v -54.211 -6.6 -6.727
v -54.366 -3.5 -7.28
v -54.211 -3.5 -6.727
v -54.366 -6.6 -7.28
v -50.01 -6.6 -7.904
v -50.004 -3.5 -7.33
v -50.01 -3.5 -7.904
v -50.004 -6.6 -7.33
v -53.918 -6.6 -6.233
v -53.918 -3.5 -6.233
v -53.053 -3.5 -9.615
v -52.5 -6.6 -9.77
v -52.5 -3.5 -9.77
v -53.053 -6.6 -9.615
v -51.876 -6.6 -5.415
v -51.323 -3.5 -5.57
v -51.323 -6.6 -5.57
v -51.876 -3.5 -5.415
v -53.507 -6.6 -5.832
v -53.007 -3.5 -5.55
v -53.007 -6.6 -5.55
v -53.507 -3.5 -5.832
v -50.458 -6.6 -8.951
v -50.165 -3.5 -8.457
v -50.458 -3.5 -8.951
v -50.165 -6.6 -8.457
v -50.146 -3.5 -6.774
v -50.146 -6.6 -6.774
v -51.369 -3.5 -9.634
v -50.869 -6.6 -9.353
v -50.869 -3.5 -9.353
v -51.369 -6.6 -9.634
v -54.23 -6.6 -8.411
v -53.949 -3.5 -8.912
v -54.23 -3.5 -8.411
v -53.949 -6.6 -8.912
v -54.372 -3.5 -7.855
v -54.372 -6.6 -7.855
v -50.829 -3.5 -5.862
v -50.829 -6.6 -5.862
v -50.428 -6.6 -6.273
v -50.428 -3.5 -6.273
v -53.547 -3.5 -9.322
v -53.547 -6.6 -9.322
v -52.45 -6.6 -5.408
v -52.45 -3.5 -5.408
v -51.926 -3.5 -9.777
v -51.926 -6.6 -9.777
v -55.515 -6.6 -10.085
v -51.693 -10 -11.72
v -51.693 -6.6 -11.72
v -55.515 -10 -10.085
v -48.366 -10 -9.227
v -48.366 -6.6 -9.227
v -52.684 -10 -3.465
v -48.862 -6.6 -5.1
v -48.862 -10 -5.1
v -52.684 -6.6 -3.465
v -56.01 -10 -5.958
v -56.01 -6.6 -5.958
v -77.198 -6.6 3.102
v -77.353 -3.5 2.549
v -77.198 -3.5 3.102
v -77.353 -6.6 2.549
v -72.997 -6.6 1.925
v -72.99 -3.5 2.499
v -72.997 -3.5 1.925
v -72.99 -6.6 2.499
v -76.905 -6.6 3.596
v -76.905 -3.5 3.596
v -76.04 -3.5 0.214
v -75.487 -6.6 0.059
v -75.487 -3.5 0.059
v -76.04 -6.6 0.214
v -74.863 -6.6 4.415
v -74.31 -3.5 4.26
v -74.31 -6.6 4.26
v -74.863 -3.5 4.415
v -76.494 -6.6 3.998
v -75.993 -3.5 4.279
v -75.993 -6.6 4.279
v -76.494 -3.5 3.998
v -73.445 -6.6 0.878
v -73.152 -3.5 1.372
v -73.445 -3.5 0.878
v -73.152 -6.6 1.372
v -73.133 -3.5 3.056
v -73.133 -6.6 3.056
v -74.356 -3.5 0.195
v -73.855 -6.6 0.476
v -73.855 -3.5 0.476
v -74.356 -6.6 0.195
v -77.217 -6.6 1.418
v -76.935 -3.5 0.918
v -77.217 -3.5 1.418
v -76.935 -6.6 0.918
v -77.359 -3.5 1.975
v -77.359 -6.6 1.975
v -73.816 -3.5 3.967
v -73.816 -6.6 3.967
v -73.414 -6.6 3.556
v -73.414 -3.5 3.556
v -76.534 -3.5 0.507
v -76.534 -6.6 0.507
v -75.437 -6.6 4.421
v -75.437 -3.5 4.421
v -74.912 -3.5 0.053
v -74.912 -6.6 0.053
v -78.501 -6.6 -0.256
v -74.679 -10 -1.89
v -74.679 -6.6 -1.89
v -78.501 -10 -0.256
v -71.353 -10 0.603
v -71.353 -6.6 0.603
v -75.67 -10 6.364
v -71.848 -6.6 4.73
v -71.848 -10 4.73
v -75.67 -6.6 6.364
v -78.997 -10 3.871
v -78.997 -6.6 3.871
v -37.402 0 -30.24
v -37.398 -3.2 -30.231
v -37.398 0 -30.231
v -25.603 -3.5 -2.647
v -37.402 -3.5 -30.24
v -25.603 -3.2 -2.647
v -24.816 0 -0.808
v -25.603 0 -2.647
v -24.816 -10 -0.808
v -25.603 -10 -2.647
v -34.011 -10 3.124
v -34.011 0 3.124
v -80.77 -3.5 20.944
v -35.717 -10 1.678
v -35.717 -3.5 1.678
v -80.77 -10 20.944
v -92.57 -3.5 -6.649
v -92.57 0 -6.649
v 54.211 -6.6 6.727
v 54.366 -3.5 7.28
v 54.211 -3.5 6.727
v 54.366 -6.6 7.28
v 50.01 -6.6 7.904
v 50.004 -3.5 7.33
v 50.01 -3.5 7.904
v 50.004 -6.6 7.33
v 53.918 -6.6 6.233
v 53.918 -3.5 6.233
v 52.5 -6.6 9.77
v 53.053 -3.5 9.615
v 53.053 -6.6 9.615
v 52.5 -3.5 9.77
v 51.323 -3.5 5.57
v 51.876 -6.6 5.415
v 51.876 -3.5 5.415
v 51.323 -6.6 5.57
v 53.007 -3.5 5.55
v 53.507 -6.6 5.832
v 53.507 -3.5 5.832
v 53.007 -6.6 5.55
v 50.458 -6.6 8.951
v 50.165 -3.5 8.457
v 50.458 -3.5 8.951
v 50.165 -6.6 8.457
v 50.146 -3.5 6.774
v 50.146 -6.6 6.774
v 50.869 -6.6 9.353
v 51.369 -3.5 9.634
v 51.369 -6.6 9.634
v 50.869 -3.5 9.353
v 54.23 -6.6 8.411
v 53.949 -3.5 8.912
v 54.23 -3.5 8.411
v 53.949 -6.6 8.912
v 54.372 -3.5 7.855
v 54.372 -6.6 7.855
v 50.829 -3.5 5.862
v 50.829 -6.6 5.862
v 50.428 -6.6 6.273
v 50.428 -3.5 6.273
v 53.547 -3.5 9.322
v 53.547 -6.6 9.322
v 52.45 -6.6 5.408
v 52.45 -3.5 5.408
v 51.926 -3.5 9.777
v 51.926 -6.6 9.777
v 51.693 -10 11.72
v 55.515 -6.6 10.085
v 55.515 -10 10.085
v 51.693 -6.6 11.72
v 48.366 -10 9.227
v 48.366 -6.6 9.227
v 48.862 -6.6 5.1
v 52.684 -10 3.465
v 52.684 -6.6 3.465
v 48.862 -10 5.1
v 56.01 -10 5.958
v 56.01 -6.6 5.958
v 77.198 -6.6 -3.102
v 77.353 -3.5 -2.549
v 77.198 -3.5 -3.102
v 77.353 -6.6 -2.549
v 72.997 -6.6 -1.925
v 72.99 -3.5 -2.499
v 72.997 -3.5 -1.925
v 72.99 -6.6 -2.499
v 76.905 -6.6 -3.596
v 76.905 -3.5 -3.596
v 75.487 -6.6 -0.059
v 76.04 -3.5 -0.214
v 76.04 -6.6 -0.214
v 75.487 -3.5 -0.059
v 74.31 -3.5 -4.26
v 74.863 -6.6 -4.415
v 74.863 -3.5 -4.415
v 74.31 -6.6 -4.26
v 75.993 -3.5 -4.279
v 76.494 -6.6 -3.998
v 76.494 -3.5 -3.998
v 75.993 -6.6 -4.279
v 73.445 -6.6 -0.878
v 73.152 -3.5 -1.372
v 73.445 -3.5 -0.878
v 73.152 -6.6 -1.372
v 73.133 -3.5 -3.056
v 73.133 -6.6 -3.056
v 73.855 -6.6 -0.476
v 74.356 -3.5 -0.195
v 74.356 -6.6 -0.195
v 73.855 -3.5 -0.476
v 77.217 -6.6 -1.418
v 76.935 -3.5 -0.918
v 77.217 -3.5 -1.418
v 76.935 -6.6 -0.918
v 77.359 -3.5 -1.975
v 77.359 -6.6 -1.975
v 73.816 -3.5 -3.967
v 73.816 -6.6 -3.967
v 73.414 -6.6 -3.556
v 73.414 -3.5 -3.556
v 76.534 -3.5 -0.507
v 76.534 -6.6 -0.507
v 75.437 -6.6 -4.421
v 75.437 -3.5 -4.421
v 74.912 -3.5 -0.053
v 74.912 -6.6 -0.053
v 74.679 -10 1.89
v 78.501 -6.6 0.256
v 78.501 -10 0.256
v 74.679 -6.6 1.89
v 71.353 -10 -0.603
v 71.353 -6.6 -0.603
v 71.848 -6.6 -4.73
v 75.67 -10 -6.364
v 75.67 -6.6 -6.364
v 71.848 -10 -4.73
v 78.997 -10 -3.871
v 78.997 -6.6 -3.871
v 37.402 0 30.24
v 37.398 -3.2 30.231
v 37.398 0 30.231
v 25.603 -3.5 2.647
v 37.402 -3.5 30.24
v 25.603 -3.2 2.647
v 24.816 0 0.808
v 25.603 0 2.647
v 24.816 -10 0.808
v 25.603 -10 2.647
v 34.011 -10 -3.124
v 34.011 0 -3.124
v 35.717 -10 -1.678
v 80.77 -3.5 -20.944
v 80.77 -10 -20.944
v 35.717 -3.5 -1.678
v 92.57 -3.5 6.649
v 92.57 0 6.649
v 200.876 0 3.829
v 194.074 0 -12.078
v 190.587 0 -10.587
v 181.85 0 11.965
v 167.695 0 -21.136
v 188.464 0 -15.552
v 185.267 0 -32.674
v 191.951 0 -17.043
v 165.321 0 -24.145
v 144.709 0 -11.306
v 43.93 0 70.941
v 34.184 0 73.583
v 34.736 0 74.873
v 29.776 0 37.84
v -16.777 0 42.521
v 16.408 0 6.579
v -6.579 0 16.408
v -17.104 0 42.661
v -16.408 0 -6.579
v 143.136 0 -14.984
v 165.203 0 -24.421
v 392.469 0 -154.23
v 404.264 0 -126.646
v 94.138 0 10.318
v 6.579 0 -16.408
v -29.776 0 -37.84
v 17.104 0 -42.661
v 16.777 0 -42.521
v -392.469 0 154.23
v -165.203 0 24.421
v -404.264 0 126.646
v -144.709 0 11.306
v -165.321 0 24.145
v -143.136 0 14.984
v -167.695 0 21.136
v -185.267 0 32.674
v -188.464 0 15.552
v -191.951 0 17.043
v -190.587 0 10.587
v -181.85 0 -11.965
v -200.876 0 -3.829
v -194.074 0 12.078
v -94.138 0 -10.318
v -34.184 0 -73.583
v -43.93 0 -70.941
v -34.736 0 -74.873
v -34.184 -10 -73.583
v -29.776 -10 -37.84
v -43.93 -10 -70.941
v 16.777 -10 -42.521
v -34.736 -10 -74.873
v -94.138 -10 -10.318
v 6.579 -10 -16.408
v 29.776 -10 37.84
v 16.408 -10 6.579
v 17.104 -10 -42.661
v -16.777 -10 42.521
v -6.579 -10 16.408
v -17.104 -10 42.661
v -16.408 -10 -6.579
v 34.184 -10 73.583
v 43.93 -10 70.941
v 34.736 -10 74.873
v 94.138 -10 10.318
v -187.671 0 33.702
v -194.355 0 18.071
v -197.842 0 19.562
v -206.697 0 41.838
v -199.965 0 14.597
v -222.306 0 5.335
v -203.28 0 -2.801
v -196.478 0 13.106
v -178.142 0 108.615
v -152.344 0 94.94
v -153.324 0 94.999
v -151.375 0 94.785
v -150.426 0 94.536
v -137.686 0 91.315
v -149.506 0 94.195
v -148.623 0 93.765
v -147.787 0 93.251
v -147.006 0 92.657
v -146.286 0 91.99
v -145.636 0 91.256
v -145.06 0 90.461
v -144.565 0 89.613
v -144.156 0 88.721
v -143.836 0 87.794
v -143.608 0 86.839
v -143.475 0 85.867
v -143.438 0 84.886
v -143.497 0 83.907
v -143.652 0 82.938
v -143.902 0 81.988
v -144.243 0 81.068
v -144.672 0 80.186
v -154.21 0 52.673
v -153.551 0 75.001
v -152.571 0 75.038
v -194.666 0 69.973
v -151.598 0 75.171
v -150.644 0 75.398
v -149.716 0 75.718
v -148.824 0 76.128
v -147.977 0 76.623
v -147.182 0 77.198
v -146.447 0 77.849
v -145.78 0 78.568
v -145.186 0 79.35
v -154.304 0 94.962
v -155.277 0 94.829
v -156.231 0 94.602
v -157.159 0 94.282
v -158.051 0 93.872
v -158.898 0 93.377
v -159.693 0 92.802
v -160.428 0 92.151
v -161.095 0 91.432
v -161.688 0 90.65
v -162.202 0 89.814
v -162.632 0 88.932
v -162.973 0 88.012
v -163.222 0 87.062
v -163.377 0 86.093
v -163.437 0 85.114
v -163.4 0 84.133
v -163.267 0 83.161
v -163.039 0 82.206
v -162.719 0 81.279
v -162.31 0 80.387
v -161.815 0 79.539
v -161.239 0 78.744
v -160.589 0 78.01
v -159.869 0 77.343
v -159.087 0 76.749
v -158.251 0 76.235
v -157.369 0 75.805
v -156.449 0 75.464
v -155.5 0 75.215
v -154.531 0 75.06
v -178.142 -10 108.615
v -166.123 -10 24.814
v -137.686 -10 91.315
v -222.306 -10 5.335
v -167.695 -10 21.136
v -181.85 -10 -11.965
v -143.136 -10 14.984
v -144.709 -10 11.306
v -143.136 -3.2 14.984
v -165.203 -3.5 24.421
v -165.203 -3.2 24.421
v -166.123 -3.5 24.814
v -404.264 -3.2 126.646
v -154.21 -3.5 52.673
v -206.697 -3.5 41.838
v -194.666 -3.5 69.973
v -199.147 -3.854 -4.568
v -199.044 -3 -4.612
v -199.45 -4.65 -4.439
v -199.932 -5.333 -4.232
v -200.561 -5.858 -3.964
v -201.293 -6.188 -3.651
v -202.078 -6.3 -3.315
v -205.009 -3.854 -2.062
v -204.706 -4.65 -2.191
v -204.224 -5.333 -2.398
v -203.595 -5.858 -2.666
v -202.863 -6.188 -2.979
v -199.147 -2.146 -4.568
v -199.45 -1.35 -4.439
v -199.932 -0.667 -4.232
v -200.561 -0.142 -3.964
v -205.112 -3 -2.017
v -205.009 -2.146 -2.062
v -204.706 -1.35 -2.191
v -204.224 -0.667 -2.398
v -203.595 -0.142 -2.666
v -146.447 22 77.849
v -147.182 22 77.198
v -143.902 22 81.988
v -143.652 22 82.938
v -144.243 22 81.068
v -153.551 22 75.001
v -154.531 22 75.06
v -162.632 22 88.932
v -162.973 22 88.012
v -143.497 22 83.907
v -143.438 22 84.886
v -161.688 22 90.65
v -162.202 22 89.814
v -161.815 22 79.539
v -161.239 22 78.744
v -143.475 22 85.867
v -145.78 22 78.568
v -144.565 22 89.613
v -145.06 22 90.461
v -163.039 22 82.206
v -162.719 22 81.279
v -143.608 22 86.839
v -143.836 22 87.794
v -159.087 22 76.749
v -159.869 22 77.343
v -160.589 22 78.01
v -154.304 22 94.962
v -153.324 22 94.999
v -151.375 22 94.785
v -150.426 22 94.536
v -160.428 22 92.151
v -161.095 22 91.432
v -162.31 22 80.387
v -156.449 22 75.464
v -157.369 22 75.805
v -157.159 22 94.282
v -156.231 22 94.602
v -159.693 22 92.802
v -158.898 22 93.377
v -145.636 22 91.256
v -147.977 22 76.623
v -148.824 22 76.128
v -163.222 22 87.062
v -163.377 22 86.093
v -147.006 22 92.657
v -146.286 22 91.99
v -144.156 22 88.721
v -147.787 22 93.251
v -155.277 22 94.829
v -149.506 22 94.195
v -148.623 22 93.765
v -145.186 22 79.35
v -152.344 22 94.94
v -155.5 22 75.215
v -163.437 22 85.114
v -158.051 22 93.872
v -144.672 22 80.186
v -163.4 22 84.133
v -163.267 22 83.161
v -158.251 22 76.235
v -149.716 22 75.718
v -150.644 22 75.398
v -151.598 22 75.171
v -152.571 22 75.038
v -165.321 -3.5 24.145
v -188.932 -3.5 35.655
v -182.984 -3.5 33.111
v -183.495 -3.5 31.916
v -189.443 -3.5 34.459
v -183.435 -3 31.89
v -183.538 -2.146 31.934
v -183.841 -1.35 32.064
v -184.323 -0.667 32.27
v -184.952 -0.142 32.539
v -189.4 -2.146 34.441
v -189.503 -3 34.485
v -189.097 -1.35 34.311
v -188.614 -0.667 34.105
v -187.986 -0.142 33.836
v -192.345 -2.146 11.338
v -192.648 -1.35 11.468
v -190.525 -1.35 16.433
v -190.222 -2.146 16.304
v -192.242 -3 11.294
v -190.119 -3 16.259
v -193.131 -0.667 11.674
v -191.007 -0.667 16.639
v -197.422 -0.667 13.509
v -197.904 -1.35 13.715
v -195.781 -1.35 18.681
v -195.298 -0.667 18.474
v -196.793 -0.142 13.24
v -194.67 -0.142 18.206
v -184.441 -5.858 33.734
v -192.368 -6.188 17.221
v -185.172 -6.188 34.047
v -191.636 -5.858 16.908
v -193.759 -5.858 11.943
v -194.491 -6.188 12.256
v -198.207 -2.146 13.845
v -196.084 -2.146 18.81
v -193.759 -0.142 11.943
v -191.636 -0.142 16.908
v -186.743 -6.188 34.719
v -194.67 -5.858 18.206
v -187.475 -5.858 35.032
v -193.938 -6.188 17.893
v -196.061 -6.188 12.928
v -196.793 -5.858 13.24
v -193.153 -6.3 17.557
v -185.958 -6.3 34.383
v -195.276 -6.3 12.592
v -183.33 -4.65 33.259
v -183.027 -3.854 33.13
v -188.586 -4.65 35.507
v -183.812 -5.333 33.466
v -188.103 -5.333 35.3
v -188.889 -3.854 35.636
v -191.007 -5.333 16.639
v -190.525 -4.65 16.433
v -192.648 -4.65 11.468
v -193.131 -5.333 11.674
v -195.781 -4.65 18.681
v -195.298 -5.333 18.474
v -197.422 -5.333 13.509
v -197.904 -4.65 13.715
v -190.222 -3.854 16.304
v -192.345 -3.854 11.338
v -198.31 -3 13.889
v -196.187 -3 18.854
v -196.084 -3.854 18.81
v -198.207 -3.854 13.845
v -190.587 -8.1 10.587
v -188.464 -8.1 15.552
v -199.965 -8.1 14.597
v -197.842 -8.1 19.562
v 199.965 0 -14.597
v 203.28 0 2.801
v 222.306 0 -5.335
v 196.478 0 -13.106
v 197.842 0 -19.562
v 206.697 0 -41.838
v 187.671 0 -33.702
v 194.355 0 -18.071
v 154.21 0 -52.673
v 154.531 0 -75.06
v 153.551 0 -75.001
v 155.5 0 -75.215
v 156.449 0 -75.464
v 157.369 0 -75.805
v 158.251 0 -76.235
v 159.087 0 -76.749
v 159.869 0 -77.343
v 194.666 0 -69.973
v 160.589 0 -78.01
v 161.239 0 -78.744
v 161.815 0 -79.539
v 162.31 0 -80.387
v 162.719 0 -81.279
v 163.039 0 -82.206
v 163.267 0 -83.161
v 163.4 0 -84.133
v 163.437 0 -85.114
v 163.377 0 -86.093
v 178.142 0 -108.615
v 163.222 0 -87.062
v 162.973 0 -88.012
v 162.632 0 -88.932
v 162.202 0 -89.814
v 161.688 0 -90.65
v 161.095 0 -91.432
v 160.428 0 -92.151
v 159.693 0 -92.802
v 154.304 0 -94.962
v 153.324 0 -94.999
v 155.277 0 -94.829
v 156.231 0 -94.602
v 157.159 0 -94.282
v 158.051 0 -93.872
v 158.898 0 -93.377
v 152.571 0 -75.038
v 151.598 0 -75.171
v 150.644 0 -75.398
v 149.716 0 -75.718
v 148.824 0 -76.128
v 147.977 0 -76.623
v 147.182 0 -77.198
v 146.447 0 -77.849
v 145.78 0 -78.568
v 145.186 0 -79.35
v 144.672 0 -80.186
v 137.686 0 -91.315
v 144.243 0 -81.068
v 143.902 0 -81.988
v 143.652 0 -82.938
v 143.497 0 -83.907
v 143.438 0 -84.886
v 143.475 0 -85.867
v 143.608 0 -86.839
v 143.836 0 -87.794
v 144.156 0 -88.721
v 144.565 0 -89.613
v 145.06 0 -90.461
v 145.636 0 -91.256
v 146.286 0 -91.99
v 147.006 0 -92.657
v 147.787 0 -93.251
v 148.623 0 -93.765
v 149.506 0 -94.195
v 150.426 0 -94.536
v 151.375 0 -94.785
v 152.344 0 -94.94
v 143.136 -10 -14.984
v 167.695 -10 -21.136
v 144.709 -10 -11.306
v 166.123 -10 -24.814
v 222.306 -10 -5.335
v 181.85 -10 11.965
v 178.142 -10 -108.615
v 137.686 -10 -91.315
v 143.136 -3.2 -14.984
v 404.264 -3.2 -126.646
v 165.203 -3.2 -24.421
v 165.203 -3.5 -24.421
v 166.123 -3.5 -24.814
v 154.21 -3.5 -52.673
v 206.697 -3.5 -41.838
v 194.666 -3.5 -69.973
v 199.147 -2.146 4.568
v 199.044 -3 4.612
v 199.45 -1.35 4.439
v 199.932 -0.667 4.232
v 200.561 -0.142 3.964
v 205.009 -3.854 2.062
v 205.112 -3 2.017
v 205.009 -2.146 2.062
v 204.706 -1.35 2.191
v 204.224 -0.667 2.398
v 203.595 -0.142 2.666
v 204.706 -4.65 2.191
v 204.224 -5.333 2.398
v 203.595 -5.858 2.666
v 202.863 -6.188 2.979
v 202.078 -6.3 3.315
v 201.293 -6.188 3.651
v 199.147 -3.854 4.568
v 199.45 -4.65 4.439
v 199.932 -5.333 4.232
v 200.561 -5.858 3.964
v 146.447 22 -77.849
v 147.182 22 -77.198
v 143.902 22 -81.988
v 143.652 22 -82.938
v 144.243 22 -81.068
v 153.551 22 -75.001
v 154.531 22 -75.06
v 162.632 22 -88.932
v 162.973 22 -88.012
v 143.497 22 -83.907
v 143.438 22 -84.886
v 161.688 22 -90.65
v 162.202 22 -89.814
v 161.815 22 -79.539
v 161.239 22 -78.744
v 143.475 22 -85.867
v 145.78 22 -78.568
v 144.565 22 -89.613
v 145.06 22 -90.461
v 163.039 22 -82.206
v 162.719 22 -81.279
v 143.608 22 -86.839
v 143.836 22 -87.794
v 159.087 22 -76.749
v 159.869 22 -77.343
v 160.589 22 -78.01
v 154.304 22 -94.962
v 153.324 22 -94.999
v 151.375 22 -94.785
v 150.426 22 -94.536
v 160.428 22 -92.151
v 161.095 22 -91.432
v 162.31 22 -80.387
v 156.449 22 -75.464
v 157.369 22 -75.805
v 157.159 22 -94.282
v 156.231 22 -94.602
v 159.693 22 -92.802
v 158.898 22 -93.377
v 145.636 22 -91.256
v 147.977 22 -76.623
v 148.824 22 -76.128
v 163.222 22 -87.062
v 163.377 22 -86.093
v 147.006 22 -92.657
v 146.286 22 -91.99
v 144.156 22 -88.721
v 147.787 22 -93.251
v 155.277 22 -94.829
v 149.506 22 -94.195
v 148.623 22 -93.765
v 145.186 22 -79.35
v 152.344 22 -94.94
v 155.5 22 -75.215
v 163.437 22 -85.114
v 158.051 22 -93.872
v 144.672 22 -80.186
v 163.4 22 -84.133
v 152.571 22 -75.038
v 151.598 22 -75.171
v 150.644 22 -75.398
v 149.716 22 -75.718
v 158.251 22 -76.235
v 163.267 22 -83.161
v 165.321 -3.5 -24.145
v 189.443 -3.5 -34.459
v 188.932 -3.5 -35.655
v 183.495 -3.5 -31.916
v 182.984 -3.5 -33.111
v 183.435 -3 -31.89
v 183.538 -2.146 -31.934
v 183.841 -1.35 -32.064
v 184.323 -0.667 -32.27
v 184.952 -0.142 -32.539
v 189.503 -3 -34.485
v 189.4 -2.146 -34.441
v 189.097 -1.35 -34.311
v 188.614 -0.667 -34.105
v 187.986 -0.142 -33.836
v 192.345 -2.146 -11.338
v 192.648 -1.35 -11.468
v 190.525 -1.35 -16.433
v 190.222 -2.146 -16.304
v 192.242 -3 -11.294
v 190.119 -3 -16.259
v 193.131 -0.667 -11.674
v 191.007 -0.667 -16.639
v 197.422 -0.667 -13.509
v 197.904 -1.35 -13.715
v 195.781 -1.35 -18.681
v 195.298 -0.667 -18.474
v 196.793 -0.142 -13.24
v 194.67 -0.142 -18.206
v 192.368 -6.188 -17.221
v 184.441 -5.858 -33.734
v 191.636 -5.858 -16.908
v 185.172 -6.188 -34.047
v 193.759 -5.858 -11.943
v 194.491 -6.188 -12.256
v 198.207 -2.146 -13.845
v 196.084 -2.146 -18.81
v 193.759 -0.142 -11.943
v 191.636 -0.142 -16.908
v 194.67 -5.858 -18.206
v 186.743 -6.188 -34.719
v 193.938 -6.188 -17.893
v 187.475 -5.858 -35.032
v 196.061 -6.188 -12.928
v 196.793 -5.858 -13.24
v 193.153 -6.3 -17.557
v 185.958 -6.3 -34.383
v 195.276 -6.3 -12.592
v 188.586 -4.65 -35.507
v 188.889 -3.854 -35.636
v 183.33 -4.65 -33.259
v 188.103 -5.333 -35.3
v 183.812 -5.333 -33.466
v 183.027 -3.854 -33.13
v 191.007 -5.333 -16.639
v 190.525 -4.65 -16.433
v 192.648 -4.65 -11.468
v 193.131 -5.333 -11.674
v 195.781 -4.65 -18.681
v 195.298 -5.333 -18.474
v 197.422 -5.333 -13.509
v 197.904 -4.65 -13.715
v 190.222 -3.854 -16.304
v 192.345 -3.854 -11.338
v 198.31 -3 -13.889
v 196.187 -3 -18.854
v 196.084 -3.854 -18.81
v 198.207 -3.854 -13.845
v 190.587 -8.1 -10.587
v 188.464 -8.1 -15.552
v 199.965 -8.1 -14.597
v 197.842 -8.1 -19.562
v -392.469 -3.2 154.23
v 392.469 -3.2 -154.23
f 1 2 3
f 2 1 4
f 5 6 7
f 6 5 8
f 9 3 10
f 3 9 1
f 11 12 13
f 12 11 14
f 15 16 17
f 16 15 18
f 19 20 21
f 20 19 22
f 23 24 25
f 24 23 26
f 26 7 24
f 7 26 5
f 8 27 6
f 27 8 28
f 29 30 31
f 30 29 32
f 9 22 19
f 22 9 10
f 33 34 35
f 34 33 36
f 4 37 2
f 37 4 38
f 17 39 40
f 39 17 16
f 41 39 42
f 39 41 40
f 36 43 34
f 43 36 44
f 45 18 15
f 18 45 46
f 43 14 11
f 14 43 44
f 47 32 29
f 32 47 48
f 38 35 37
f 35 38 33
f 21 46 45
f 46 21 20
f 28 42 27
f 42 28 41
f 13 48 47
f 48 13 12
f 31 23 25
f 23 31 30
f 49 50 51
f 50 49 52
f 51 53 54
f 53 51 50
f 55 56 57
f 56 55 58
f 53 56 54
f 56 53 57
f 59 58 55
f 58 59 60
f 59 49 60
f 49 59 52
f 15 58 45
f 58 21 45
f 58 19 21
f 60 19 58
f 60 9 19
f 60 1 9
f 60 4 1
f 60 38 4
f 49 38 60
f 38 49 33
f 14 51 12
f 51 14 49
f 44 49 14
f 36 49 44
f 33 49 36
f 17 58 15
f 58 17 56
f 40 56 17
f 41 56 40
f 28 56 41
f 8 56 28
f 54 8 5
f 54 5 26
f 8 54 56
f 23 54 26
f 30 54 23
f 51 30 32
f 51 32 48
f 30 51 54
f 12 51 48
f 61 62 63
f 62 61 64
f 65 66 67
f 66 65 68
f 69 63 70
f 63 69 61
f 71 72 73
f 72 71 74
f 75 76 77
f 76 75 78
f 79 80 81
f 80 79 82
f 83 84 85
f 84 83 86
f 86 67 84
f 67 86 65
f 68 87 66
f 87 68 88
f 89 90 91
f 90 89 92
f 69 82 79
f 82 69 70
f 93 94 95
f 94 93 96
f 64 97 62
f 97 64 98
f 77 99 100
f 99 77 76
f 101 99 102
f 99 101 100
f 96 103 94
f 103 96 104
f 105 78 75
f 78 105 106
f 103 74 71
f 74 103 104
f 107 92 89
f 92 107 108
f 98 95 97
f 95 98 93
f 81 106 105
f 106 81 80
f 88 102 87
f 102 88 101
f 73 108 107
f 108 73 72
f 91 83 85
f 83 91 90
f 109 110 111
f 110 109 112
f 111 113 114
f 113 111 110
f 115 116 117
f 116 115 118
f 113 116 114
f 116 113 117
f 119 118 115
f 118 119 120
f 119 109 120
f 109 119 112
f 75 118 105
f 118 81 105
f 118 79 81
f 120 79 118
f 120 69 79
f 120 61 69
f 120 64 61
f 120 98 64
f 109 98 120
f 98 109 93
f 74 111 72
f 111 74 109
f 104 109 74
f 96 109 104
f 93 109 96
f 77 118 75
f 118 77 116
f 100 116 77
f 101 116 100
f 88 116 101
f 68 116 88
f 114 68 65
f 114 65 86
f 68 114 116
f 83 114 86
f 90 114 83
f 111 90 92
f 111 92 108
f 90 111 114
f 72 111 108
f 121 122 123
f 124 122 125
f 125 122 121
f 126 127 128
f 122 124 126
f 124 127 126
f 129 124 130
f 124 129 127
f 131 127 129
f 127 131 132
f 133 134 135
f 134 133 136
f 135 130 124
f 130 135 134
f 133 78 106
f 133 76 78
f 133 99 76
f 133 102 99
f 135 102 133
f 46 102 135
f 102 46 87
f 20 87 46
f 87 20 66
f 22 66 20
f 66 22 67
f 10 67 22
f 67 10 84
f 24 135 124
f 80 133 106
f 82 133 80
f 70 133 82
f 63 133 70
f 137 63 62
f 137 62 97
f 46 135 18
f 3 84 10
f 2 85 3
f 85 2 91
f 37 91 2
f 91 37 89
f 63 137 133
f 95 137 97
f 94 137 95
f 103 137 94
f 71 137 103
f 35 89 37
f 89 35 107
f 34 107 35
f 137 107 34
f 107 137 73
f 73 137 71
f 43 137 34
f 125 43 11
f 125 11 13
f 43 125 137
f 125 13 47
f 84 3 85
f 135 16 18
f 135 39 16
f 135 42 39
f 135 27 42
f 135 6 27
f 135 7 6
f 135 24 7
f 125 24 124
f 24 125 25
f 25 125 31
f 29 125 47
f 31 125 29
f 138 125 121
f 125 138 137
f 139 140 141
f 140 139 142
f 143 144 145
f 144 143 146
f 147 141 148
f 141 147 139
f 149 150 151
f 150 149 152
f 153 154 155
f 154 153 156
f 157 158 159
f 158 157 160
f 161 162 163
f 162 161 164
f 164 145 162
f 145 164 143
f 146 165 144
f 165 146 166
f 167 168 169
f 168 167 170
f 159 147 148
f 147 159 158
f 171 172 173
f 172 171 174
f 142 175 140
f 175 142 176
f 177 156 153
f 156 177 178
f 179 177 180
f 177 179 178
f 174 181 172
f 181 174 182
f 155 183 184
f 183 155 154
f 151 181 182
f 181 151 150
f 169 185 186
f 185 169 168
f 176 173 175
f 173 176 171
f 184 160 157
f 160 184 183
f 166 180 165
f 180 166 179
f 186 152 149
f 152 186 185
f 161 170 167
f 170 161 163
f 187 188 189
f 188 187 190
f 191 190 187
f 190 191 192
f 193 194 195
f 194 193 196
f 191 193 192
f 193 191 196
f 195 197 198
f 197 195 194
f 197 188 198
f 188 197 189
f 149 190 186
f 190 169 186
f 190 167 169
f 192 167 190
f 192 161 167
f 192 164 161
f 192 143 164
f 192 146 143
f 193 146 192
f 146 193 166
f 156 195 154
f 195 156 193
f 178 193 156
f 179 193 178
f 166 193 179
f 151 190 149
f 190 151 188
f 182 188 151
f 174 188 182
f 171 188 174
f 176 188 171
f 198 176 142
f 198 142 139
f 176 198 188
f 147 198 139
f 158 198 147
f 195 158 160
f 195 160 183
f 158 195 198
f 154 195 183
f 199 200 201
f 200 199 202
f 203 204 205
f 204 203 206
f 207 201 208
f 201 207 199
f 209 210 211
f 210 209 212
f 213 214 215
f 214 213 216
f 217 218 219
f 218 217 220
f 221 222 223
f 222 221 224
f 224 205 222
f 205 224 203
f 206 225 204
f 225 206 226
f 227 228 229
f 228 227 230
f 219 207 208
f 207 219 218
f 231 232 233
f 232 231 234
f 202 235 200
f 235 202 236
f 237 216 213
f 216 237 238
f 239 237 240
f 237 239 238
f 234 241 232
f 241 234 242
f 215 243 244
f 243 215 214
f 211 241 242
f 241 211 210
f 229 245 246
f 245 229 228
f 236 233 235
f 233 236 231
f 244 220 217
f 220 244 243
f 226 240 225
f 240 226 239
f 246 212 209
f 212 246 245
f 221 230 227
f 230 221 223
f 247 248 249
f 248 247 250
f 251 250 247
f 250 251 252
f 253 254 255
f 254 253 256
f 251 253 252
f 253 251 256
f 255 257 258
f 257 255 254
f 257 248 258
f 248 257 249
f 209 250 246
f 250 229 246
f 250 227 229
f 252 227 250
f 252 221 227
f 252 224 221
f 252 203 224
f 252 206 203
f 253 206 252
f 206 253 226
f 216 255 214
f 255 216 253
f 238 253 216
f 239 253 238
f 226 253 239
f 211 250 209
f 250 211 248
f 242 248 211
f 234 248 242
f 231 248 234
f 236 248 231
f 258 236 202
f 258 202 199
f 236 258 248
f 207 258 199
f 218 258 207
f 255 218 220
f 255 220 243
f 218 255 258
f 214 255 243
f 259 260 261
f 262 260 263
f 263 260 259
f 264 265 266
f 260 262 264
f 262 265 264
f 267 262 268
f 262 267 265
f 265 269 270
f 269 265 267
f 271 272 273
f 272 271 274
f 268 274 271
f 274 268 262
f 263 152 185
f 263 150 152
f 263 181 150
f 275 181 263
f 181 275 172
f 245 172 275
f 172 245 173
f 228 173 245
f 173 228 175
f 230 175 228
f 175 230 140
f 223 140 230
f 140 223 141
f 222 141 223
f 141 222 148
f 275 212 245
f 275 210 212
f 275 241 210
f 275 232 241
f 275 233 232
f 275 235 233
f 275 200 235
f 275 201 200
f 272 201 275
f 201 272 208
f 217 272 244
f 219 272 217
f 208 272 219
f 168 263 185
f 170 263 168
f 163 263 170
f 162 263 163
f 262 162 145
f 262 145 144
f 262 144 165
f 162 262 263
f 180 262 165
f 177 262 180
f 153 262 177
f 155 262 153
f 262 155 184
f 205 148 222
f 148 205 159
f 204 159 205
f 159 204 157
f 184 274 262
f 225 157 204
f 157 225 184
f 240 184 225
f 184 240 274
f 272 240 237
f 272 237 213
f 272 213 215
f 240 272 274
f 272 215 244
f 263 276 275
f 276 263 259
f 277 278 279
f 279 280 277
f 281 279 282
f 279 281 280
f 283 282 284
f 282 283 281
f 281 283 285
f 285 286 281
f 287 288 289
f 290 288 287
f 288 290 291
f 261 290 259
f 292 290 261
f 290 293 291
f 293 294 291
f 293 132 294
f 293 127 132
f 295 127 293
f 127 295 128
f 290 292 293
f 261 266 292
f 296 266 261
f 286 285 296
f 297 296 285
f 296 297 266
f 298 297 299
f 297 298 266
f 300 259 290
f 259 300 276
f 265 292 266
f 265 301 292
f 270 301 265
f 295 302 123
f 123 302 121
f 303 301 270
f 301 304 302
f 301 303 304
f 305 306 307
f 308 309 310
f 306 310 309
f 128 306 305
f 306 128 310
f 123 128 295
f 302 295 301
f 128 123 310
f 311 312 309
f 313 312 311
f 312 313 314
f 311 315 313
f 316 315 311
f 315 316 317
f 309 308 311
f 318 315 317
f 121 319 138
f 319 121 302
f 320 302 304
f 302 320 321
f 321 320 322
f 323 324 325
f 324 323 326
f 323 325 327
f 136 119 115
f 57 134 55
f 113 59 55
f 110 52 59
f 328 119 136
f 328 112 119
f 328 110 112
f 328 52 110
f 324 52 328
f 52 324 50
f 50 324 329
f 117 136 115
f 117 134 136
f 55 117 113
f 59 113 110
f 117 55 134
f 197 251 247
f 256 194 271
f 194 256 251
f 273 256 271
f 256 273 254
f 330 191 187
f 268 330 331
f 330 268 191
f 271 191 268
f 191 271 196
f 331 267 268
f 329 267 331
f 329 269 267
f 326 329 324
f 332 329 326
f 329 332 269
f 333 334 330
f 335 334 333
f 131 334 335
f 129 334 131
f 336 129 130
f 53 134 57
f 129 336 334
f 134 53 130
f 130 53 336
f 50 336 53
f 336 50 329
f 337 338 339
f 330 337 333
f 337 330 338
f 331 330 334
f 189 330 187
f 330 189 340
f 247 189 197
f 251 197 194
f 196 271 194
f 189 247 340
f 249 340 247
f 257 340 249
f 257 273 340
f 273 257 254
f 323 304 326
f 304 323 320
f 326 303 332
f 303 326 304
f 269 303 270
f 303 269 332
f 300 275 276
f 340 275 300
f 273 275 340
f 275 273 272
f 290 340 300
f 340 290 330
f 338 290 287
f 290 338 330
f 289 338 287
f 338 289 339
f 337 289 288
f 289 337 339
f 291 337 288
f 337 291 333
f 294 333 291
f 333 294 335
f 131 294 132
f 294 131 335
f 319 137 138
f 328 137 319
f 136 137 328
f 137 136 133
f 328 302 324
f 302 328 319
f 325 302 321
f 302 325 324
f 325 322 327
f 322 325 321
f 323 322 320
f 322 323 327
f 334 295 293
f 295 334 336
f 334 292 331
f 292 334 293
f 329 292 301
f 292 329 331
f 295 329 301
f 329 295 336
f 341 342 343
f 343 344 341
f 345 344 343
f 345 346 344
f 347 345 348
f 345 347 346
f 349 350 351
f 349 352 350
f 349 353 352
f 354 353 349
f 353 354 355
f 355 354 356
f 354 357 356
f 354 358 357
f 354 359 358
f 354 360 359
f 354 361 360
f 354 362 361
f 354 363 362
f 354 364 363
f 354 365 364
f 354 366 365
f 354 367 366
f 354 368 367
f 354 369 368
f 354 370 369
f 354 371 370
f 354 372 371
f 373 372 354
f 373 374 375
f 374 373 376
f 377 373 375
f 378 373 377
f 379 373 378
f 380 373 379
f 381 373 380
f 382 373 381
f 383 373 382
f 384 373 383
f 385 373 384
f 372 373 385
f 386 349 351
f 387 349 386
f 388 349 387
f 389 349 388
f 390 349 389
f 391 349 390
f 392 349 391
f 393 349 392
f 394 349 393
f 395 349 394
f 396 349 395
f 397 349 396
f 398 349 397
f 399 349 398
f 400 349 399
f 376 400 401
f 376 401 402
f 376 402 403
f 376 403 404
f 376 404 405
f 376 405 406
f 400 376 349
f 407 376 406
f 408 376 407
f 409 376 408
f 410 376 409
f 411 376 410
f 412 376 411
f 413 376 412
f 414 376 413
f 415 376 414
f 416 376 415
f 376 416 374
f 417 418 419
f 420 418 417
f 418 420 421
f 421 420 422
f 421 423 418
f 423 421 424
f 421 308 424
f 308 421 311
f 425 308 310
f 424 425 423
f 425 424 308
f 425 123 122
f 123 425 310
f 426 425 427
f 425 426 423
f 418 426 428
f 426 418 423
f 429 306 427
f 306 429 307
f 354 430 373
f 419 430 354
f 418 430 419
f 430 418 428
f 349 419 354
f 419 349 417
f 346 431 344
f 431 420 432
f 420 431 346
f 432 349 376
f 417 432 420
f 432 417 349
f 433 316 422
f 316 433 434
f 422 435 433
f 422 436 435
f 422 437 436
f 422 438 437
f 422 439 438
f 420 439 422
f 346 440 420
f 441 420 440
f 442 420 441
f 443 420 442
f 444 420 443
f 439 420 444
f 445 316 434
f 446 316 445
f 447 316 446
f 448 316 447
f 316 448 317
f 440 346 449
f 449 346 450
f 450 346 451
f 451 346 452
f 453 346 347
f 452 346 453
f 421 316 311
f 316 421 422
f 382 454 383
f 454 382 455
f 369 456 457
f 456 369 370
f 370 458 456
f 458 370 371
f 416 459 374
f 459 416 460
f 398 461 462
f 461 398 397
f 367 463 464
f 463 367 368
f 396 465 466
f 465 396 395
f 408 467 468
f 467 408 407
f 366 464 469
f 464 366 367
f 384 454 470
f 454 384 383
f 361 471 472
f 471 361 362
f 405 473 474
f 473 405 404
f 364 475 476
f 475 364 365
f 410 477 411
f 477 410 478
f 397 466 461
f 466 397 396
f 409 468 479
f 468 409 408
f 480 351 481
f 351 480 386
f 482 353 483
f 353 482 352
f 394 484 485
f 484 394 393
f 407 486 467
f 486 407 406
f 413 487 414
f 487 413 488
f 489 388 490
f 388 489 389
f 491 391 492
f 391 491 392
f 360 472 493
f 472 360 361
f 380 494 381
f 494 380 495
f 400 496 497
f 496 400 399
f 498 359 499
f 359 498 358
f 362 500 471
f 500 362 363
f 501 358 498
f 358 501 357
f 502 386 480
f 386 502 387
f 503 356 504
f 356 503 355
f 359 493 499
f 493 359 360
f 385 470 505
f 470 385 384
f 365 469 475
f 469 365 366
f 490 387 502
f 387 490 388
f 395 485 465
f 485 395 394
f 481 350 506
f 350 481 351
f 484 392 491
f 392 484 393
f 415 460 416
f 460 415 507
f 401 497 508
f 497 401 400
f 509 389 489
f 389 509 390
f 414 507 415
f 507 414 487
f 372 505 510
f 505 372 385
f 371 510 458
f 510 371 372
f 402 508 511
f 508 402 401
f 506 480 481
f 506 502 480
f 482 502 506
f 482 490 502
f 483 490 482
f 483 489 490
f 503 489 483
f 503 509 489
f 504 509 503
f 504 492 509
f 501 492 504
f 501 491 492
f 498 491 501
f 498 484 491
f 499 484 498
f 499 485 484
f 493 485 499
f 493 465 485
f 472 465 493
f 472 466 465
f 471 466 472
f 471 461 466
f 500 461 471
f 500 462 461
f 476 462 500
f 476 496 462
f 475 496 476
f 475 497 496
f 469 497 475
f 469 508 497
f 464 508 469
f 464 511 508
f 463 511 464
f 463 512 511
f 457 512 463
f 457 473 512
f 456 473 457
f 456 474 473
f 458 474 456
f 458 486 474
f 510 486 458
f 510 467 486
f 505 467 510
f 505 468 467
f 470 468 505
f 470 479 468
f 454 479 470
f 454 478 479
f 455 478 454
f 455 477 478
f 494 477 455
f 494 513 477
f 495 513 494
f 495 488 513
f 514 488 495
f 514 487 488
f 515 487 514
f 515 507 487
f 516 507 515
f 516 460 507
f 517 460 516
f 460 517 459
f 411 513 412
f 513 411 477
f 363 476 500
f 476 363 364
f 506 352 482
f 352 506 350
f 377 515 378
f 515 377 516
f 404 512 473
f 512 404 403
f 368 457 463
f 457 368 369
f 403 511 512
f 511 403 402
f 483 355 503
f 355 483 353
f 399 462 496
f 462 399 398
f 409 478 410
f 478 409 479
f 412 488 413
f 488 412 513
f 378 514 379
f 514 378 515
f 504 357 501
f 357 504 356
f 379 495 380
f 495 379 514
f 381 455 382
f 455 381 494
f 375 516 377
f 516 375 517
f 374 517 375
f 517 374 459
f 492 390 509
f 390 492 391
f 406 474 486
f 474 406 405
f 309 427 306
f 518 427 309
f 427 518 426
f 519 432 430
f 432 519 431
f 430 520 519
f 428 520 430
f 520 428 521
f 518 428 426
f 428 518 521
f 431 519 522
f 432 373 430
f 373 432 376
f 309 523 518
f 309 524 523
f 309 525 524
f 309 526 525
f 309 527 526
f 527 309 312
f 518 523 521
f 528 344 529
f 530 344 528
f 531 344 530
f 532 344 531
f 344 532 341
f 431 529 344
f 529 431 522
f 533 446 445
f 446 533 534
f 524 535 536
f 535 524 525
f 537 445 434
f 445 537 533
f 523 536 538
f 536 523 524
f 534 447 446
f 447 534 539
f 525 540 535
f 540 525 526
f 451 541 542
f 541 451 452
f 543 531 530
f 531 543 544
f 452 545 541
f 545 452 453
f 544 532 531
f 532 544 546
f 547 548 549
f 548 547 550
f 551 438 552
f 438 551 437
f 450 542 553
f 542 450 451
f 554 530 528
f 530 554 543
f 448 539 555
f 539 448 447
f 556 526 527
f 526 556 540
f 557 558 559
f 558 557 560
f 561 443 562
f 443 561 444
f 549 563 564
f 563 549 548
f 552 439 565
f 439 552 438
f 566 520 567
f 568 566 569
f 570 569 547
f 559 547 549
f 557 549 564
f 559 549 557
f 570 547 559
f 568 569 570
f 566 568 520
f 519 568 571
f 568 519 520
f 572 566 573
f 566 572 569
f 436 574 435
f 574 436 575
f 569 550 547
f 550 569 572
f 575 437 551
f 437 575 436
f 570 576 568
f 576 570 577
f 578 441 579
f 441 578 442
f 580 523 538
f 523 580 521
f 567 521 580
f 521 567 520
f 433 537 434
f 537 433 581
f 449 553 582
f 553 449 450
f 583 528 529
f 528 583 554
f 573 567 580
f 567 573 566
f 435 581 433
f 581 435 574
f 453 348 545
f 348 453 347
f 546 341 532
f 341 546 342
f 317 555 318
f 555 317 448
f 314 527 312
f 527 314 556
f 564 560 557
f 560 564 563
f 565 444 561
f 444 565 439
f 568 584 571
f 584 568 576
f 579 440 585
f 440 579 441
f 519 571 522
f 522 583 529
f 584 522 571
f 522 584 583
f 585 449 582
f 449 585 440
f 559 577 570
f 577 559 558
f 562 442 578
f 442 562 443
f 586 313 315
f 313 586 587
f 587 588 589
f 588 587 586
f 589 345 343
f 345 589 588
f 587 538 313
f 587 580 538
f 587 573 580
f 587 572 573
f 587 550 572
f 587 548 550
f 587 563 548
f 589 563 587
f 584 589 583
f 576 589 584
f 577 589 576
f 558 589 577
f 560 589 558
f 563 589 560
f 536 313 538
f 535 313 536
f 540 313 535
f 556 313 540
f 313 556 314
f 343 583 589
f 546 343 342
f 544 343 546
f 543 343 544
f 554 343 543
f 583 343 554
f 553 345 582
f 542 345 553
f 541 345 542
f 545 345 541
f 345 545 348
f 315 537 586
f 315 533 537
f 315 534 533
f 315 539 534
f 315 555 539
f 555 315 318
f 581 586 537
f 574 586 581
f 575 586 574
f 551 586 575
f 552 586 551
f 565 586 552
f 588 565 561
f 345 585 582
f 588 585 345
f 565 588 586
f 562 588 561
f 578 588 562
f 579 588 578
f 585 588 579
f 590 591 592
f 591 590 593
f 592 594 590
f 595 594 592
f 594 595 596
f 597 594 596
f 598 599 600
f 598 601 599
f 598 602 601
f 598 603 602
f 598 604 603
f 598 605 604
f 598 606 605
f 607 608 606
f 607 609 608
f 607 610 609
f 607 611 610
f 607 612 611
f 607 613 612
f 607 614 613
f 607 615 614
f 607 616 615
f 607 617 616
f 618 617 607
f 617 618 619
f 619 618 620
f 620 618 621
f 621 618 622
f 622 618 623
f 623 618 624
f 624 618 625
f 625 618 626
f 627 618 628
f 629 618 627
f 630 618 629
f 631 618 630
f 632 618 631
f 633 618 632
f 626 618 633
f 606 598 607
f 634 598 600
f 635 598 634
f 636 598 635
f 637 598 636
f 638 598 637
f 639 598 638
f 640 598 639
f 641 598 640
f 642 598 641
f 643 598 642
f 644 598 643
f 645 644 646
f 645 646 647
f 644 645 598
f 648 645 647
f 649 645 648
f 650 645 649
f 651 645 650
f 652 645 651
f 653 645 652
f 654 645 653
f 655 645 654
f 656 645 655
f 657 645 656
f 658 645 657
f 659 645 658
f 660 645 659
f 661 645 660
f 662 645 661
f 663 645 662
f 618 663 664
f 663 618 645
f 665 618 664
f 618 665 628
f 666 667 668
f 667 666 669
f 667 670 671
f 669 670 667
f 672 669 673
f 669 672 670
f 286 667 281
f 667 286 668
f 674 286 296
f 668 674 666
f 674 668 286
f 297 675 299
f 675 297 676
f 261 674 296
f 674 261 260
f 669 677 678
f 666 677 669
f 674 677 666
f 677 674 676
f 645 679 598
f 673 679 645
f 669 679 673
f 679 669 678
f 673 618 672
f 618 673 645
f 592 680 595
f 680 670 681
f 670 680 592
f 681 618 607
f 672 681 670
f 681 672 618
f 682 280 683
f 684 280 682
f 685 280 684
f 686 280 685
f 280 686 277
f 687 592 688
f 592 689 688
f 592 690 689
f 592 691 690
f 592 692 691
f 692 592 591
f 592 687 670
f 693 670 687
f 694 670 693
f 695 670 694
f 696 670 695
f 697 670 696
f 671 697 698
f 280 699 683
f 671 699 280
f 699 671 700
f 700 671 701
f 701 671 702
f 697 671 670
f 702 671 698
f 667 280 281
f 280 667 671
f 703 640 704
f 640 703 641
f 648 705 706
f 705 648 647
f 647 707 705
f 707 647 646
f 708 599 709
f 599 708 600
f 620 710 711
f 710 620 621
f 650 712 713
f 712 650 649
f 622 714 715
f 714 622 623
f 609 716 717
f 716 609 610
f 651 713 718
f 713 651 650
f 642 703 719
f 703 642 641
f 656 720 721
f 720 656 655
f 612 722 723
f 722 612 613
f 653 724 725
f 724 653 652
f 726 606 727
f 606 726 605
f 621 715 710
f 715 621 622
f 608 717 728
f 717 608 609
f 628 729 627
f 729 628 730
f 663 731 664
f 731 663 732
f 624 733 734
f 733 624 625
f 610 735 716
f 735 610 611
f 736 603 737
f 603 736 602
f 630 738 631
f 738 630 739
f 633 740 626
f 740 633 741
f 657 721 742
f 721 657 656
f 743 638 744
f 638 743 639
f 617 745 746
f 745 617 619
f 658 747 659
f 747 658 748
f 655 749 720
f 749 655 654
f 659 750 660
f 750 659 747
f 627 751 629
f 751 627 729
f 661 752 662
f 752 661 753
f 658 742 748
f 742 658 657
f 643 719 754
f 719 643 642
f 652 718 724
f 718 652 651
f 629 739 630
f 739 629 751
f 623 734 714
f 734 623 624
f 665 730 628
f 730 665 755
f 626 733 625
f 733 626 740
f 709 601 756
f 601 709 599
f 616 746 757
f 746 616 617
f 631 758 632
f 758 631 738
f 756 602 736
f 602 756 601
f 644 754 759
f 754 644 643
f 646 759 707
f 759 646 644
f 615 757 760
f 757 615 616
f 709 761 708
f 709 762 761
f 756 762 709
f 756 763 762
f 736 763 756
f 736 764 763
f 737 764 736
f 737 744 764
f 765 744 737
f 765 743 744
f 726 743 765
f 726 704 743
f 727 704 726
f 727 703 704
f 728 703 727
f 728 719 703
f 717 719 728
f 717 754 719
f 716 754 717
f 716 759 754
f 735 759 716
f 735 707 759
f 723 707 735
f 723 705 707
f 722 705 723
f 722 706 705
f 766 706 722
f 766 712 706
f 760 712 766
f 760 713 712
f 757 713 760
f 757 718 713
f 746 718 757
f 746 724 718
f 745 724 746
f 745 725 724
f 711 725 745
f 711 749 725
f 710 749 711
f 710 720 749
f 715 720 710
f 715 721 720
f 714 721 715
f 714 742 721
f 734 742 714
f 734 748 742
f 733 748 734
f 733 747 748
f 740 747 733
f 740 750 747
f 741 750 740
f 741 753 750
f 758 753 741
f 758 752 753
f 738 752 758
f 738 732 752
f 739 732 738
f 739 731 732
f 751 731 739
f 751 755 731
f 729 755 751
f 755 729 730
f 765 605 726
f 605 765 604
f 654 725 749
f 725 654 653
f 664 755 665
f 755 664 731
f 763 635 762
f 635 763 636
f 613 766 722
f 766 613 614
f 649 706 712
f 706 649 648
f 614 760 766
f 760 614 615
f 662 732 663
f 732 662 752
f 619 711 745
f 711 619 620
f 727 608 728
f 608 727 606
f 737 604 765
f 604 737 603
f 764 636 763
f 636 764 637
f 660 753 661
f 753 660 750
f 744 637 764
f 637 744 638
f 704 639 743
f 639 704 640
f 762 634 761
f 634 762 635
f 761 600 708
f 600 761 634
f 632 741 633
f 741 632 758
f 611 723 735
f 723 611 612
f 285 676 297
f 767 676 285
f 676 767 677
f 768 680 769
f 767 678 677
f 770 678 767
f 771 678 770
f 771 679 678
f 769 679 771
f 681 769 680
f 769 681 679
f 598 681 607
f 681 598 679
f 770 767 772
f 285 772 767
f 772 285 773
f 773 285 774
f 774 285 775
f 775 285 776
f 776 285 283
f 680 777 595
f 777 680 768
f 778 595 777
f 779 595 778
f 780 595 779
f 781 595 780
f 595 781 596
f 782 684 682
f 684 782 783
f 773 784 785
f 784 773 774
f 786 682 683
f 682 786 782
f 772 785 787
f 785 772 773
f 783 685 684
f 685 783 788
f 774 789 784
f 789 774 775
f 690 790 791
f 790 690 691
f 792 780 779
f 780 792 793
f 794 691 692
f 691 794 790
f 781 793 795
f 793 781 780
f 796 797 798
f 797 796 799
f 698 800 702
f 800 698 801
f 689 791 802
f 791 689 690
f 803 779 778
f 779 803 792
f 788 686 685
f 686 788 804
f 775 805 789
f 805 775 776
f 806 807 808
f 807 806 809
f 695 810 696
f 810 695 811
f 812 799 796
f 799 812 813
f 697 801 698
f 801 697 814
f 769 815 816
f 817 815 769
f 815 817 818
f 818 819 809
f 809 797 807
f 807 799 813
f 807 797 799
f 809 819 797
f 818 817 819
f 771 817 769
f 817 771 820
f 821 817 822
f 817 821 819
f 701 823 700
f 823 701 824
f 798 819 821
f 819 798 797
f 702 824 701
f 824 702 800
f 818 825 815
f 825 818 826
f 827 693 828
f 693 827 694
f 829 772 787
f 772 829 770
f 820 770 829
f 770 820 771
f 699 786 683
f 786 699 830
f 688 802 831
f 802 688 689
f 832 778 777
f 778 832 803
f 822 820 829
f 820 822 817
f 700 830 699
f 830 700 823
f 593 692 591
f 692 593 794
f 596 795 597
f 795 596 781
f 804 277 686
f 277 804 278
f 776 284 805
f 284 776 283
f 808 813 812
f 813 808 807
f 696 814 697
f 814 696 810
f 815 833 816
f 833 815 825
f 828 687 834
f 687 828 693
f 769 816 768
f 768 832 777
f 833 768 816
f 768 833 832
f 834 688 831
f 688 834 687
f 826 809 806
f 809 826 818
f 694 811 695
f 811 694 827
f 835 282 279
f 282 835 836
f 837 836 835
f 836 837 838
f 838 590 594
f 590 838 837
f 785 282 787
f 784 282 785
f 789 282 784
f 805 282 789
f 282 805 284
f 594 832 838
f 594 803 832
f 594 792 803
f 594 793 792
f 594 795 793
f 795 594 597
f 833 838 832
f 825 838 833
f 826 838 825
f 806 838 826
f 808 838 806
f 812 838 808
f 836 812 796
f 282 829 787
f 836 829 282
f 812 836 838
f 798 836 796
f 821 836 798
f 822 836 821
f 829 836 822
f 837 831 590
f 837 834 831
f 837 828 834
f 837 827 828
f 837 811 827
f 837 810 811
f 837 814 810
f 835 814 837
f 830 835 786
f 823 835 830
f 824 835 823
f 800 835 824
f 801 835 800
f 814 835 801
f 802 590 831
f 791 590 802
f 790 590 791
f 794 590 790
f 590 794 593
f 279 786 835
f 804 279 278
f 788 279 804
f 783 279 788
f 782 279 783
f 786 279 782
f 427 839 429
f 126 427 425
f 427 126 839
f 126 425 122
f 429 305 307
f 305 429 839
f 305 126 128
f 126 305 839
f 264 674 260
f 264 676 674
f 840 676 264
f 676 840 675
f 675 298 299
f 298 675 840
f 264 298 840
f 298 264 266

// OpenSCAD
// Gabarito AJUSTÁVEL de riscar para emenda "scarf com cunha" (keyed scarf),
// para qualquer altura de viga (~15 a ~36 cm).
//
// Peças: 1 quadro da janela da cunha + 2 blocos iguais (imprima 2x), todos
// impressos; 2 barras chatas de alumínio 1" x 1/8" (25,4 x 3,2 mm) de
// serralheria, que são o trilho. Ferragem: 4 parafusos M4 x 16 cabeça
// chata (escareados) + 4 porcas M4 para prender as barras no quadro; 2
// parafusos borboleta M6 x 50 + 2 porcas M6 para travar os blocos.
// As barras assentam direto na madeira, rentes ao quadro: sem degrau.
//
// Geometria: o quadro segura as duas barras desencontradas pelo degrau da
// janela (5 x 5 cm, cunhas iguais em qualquer viga: 2 de 2,5 x 5). Cada bloco
// desliza numa barra; a face dele é perpendicular à barra (topo de encosto) e
// tem um pino redondo que toca a viga num ponto só.
//
// Uso:
// 1. Paquímetro: segure o gabarito em pé, atravessado na viga (ou na ponta
//    dela), com a viga entre a face do bloco e a aleta do quadro (abaixo da
//    barra). Feche, aperte a borboleta. A rampa fica = H. Faça o mesmo com o
//    outro bloco.
// 2. Deite o gabarito na face da viga, centro do quadro no eixo do apoio, e
//    gire até os dois pinos encostarem: um no topo, outro no fundo da viga.
//    O ângulo da rampa se acerta sozinho para aquela viga.
// 3. Risque pela borda das barras (rampas), pelas faces dos blocos (topos de
//    encosto, a 90 graus da rampa) e por dentro da janela. Mesma coisa na
//    outra peça da viga. Na face de trás, use o jogo espelhado.

/* [Viga para a vista montada] */
H      = 150;    // altura da viga (mm)
/* [Faixa de uso] */
H_max  = 360;    // maior viga que o gabarito alcança (define o corte das barras)
/* [Saída] */
parte  = "montado"; // [montado, quadro, bloco, tudo]
espelhado = false;  // jogo para a face de trás da viga
teste_H = false;     // mostra uma peça de comprimento H na boca do paquímetro

/* [Modo do cálculo] */
modo   = "X=kw";   // [X=kw, angulo fixo, X fixo]
kw_ref = 50;       // janela de referência para o modo "angulo fixo"
X_fixo = 50;       // topo de encosto para o modo "X fixo" (mm)

/* [Janela da cunha] */
kw  = H / 6;          // lado da janela quadrada = espessura das duas cunhas juntas (mm)

/* [Hidden] */
s   = kw / 2;      // meia altura da janela (quadrada)
fw  = 20;          // largura do quadro
bw  = 30;        // largura da barra
bt  = 3.2;         // espessura da barra
tg  = 0.3;         // folga do túnel
T   = 10;          // espessura dos blocos e da garra do quadro
bl  = 44;          // comprimento do bloco ao longo da barra
jaw = 40;          // quanto a mandíbula desce abaixo da barra
pr  = 10;          // raio do pino
pg  = 2;           // folga entre o pino e a face do bloco
H_ref = 250;       // viga em que o "na lata" é exato (nas outras o erro é ~1 mm, ver echo)
// pv (altura do centro do pino acima da linha da rampa) sai do modo escolhido,
// exato na viga H_ref. Rampa = H obriga H = 2·X·cos α + 2·H·sen α +
// kw·(sen α + cos α): com X, kw e α amarrados, o modo diz o que fica fixo.
//   "X=kw"        topo de encosto = janela (o ângulo muda com a janela)
//   "angulo fixo" ângulo da janela de referência kw_ref (X muda com a janela)
//   "X fixo"      topo de encosto = X_fixo (o ângulo muda pouco)
function theta_for_X(kwv, X0) = let(A = X0 - kwv / 2, B = -(kwv / 2 + H_ref), C = H_ref / 2,
    R = norm([A, B]), ph = atan2(B, A), t1 = ph + acos(C / R), t2 = ph - acos(C / R))
    (t1 < 0 && t1 > -80) ? t1 : t2;
function pv_for_theta(kwv, t) = let(u = -(kwv / 2 + H_ref) - pr - pg) (H_ref / 2 + pr - u * sin(t)) / cos(t);
th_alvo = modo == "angulo fixo" ? theta_for_X(kw_ref, kw_ref)
        : modo == "X fixo"      ? theta_for_X(kw, X_fixo)
        :                         theta_for_X(kw, kw);
pv  = pv_for_theta(kw, th_alvo);
function th_of(Hh, pvv) = let(u = -(kw / 2 + Hh) - pr - pg, R = norm([u, pvv]))
    180 - asin((Hh / 2 + pr) / R) - atan2(pvv, u);
ph  = 22;          // quanto o pino passa da face da madeira
clamp = 50;        // comprimento da garra do quadro em cada barra (vigas a partir de ~10 cm)
nutW = 10.2; nutT = 5.4; scr = 6.6;

// eixo da barra A (esquerda/cima): v de -s-bw a -s; barra B = A girada 180 graus
vA0 = -s - bw; vA1 = -s;
bin = fw / 2;      // quanto a barra entra por baixo do quadro (encaixe de alinhamento)
lip = 4;           // aba de alinhamento só no lado que não se risca
notch = 2;         // largura do rasgo do lápis no quadro, na continuação da régua
lip_len = 25;      // quanto a aba do bloco passa da face dele
bar_len = (kw / 2 + H_max + bl + 5) - (kw / 2 + fw) + bin;

// --- 2D ----------------------------------------------------------------------
module ring2d() difference() {
    translate([-kw / 2 - fw, -s - fw]) square([kw + 2 * fw, 2 * s + 2 * fw]);
    translate([-kw / 2, -s]) square([kw, 2 * s]);
}
// garra do quadro na barra A (a da barra B vem da simetria)
module clamp2d() translate([-kw / 2 - fw - clamp, vA0 - lip]) square([clamp + fw, bw + lip]);   // rente à barra no lado de riscar (v = vA1); aba de 4 mm no outro lado
module fin2d() translate([-kw / 2, vA0 - jaw]) square([10, (-s - fw) - (vA0 - jaw) + 1]);   // aleta, abaixo da barra: face esquerda alinhada com a face da janela (mandíbula do paquímetro)
// reforço triangular da aleta, no lado oposto à face de morder
module gusset2d() polygon([[-kw / 2 + 9, vA0 - jaw], [-kw / 2 + 9, -s - fw + 0.5], [kw / 2 + fw, -s - fw + 0.5]]);
module frame2d() {
    ring2d();
    for (k = [0, 1]) rotate(k * 180) { clamp2d(); fin2d(); gusset2d(); }
}
// bloco com a face (direita) em u = 0
module block2d() {
    translate([-bl, vA0 - jaw]) square([bl, (pv + pr + pg) - (vA0 - jaw)]);
    translate([-1, vA0 - lip]) square([lip_len + 1, lip]);   // aba de 4 mm na borda da barra que não se risca, passando da face: guia a barra e encosta a viga na hora de morder
}

// --- 3D ----------------------------------------------------------------------
// A barra assenta direto na madeira (rente ao quadro e aos blocos).
// Quadro: a garra é uma tampa por cima da barra, da mesma largura dela, presa
// por 2 parafusos M4 escareados que entram por baixo da barra (escarear a
// barra) e roscam em porcas presas na tampa. Use a própria garra como guia
// para furar a barra: os furos também alinham a barra com a janela.
m4 = 4.4; m4nut = 7.2; m4nutT = 3.4;
module frame3d() difference() {
    linear_extrude(T) frame2d();
    for (k = [0, 1]) rotate(k * 180) {
        // rasgo para o lápis entrar seguindo a reta da régua, até metade da largura do quadro
        translate([-kw / 2 - fw - 1, vA1, -1]) cube([fw / 2 + 1, notch, T + 2]);
        translate([-kw / 2 - fw - clamp - 1, vA0 - 0.01, -1]) cube([clamp + 1 + bin, bw + 0.02, bt + 1 + tg]);   // a barra entra por baixo e avança bin mm para dentro do quadro
        for (u = [-kw / 2 - fw - clamp * 0.25, -kw / 2 - fw - clamp * 0.75]) translate([u, vA0 + bw / 2, 0]) {
            cylinder(d = m4, h = T + 1, $fn = 24);
            translate([0, 0, T - m4nutT]) cylinder(d = m4nut / cos(30), h = m4nutT + 1, $fn = 6);
        }
    }
}
// Bloco: túnel aberto para o lado da madeira, com paredes dos dois lados da
// barra; a borboleta M6 entra pela ponta de baixo (mandíbula) e aperta a
// borda de baixo da barra contra a parede de cima: trava fora da viga também.
module block3d() difference() {
    union() {
        linear_extrude(T) block2d();
        translate([-pr - pg, pv, -ph]) cylinder(r = pr, h = ph + T, $fn = 64);   // pino de contato (passa da face da madeira)
    }
    translate([-bl - 1, vA0 - tg, -1]) cube([bl + 2, bw + 2 * tg, bt + tg + 1]);
    translate([-bl / 2, vA0 - jaw - 1, bt / 2 + 1.4]) rotate([-90, 0, 0]) cylinder(d = scr, h = jaw + 2, $fn = 24);
    translate([-bl / 2 - nutW / 2, vA0 - jaw / 2 - nutT / 2, -1]) cube([nutW, nutT, bt / 2 + 1.4 + nutW / 2 + 1]);   // porca M6 entra por baixo
}
module mir() if (espelhado) mirror([1, 0, 0]) children(); else children();

// --- montagem na viga: resolve o ângulo pelos pinos ------------------------------
uf = -(kw / 2 + H);                 // face do bloco A: rampa = H
Pt = [uf - pr - pg, pv];             // centro do pino A (o do bloco B é -Pt)
R  = norm(Pt);
be = atan2(Pt[1], Pt[0]);
th = 180 - asin((H / 2 + pr) / R) - be;   // ângulo da barra (negativo: desce para a direita)
// topo de encosto: onde a face do bloco (u = uf) cruza o topo da viga
Xb = ((H / 2) - (uf * sin(th) + (-s) * cos(th))) / cos(th);
Lt = 2 * ((H / 2) * 0 + abs(uf) * cos(th) + Xb * abs(sin(th)));   // comprimento aproximado da emenda no topo

module montado() {
    rotate([90, 0, 0]) {   // plano x-z = face da viga
        %translate([-700, -H / 2, -80]) cube([1400, H, 80]);   // viga (centro do quadro na meia altura, no eixo do apoio x = 0)
        rotate(th) mir() {
            color("Gold") frame3d();
            color("SteelBlue") translate([uf, 0, 0]) block3d();
            color("SteelBlue") rotate(180) translate([uf, 0, 0]) block3d();
            // peça de teste de comprimento H na boca do paquímetro (entre a face do bloco e a aleta do quadro)
            if (teste_H) for (k = [0, 1]) rotate(k * 180) color("Red", 0.8) translate([uf, vA0 - jaw + 2, T]) cube([H, jaw - 6, 6]);
            for (k = [0, 1]) rotate(k * 180) color("Silver") translate([-kw / 2 - fw + bin - bar_len, vA0, 0]) cube([bar_len, bw, bt]);
        }
    }
}

if (parte == "montado") montado();
if (parte == "quadro" || parte == "tudo") mir() rotate([180, 0, 0]) translate([0, 0, -T]) frame3d();   // imprime de cabeça para baixo
if (parte == "bloco" || parte == "tudo") mir() translate([0, parte == "tudo" ? 150 : 0, 0]) rotate([180, 0, 0]) translate([0, 0, -T]) block3d();

echo(str("pv calculado = ", round(pv * 100) / 100, " mm; viga H = ", H, ": rampa ", round(-th * 10) / 10, " graus, topo de encosto ~", round(Xb), " mm, janela ", kw, " x ", 2 * s, "; barras de alumínio 1\" x 1/8\" cortadas com ", round(bar_len), " mm (2 peças)"));
